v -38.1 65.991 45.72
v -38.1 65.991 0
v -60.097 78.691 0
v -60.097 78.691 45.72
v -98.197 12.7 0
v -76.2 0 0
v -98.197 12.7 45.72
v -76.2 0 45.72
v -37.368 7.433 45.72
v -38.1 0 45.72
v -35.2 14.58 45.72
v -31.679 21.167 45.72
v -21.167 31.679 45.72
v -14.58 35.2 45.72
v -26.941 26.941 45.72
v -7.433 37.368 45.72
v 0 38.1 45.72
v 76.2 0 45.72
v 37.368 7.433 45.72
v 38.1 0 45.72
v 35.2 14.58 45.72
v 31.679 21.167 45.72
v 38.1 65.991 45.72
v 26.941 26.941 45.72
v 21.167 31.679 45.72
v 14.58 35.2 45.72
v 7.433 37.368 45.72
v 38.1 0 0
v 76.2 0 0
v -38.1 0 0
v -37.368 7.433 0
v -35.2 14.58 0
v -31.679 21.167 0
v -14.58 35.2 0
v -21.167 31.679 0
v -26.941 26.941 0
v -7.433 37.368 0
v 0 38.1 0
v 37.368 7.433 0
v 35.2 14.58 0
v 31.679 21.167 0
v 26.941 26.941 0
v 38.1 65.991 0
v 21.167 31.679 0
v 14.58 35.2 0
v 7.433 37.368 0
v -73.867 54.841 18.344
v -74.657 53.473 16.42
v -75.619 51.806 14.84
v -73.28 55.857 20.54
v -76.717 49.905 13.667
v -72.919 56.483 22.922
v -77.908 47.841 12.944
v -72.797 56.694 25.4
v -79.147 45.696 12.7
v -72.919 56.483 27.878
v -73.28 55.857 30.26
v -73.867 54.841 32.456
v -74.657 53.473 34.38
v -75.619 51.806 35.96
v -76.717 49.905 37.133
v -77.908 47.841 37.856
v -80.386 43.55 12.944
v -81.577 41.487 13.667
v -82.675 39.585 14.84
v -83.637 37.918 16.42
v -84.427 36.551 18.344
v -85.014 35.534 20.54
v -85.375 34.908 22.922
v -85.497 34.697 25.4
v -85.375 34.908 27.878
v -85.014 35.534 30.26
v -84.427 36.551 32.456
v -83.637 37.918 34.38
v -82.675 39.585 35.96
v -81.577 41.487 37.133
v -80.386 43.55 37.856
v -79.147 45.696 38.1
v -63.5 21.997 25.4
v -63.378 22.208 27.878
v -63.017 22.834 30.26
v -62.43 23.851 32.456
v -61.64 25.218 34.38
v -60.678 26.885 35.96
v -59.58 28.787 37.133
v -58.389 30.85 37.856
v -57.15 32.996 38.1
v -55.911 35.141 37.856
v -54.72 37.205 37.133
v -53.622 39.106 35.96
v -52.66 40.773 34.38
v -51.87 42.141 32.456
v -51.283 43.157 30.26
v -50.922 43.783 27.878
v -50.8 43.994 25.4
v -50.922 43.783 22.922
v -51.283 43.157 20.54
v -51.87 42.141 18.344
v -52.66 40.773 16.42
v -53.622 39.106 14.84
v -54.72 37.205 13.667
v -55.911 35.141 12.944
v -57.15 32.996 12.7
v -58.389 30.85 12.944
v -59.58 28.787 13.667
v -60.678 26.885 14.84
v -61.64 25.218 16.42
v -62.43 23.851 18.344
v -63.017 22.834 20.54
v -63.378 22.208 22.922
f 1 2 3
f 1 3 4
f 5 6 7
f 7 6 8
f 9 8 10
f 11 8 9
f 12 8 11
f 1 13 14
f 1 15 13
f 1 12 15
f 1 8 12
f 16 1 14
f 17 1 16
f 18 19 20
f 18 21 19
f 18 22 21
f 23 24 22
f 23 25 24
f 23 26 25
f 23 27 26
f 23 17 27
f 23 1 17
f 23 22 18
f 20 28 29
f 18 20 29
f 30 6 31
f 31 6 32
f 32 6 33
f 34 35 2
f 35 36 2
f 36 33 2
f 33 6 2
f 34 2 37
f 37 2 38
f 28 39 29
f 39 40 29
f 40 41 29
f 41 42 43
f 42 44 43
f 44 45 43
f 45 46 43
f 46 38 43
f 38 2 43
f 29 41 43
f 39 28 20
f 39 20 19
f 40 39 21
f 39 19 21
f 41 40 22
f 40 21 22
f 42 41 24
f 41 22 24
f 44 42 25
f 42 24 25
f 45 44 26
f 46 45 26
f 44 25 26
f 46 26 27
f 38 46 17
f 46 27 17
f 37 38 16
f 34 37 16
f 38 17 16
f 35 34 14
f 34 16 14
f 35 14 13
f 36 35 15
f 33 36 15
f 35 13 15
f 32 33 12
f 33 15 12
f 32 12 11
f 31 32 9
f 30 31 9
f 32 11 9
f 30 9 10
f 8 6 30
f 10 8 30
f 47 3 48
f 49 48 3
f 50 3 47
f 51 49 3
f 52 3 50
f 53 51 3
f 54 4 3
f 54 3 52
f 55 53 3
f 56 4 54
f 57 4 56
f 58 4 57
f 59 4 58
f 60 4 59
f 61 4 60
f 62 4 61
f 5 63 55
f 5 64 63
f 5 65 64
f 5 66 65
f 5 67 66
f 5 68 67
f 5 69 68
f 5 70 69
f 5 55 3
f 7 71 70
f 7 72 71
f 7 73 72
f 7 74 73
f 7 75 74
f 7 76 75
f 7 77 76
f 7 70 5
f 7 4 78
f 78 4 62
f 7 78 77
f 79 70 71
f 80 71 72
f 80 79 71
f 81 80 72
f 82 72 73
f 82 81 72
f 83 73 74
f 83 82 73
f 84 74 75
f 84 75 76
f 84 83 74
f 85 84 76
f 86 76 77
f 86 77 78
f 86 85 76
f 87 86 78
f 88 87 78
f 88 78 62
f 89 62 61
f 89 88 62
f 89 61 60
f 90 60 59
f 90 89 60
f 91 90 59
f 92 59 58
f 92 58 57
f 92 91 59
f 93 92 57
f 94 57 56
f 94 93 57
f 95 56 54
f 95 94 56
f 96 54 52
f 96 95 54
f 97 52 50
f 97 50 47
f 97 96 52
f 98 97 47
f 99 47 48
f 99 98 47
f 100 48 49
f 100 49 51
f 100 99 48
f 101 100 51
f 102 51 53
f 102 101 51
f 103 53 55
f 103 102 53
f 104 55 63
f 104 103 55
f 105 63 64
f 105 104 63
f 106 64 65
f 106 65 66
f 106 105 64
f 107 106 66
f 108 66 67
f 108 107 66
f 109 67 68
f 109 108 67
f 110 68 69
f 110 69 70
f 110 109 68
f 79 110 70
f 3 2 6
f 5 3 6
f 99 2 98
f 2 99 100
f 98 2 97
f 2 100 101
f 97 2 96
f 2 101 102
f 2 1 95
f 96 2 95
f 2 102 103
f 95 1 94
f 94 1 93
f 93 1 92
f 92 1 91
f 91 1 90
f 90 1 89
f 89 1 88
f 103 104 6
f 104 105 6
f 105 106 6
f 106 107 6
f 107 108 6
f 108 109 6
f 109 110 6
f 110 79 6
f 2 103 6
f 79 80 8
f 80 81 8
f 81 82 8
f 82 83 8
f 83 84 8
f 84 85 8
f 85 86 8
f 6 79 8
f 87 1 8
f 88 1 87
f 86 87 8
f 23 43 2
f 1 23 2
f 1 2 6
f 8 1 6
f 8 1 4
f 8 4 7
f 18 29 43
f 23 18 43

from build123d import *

# Parameters (mm, degrees)
F1_DEPTH = 45.72
F2_R     = 38.1
F3_DEPTH = 45.721
F4_W     = 76.2
F4_H     = 45.72
F4_R     = 12.7
F5_DEPTH = 25.4


with BuildPart() as f1:
    # F0 (on Top) → F1 (new body)
    with BuildSketch(Plane.XY):
        Polygon((-76.2, 0), (0, 0), (-38.1, 65.991136), align=None)
        Polygon((-38.1, 65.991136), (0, 0), (76.2, 0), (38.1, 65.991136), align=None)
    extrude(amount=F1_DEPTH)

    # F2 (on face) → F3 (cut, through all)
    with BuildSketch(Plane.XY.offset(45.72)):
        Circle(F2_R)
    extrude(amount=-F3_DEPTH, mode=Mode.SUBTRACT)


with BuildPart() as f5:
    # F4 (on face) → F5 (new body)
    with BuildSketch(Plane(origin=(-57.15, 32.995568, 0), x_dir=(-0.5, -0.866025, 0), z_dir=(-0.866025, 0.5, 0))):
        with Locations((0, 22.86)):
            Rectangle(F4_W, F4_H)
        with Locations((0, 25.4)):
            Circle(F4_R, mode=Mode.SUBTRACT)
    extrude(amount=F5_DEPTH)


solid = Compound([f1.part, f5.part])
